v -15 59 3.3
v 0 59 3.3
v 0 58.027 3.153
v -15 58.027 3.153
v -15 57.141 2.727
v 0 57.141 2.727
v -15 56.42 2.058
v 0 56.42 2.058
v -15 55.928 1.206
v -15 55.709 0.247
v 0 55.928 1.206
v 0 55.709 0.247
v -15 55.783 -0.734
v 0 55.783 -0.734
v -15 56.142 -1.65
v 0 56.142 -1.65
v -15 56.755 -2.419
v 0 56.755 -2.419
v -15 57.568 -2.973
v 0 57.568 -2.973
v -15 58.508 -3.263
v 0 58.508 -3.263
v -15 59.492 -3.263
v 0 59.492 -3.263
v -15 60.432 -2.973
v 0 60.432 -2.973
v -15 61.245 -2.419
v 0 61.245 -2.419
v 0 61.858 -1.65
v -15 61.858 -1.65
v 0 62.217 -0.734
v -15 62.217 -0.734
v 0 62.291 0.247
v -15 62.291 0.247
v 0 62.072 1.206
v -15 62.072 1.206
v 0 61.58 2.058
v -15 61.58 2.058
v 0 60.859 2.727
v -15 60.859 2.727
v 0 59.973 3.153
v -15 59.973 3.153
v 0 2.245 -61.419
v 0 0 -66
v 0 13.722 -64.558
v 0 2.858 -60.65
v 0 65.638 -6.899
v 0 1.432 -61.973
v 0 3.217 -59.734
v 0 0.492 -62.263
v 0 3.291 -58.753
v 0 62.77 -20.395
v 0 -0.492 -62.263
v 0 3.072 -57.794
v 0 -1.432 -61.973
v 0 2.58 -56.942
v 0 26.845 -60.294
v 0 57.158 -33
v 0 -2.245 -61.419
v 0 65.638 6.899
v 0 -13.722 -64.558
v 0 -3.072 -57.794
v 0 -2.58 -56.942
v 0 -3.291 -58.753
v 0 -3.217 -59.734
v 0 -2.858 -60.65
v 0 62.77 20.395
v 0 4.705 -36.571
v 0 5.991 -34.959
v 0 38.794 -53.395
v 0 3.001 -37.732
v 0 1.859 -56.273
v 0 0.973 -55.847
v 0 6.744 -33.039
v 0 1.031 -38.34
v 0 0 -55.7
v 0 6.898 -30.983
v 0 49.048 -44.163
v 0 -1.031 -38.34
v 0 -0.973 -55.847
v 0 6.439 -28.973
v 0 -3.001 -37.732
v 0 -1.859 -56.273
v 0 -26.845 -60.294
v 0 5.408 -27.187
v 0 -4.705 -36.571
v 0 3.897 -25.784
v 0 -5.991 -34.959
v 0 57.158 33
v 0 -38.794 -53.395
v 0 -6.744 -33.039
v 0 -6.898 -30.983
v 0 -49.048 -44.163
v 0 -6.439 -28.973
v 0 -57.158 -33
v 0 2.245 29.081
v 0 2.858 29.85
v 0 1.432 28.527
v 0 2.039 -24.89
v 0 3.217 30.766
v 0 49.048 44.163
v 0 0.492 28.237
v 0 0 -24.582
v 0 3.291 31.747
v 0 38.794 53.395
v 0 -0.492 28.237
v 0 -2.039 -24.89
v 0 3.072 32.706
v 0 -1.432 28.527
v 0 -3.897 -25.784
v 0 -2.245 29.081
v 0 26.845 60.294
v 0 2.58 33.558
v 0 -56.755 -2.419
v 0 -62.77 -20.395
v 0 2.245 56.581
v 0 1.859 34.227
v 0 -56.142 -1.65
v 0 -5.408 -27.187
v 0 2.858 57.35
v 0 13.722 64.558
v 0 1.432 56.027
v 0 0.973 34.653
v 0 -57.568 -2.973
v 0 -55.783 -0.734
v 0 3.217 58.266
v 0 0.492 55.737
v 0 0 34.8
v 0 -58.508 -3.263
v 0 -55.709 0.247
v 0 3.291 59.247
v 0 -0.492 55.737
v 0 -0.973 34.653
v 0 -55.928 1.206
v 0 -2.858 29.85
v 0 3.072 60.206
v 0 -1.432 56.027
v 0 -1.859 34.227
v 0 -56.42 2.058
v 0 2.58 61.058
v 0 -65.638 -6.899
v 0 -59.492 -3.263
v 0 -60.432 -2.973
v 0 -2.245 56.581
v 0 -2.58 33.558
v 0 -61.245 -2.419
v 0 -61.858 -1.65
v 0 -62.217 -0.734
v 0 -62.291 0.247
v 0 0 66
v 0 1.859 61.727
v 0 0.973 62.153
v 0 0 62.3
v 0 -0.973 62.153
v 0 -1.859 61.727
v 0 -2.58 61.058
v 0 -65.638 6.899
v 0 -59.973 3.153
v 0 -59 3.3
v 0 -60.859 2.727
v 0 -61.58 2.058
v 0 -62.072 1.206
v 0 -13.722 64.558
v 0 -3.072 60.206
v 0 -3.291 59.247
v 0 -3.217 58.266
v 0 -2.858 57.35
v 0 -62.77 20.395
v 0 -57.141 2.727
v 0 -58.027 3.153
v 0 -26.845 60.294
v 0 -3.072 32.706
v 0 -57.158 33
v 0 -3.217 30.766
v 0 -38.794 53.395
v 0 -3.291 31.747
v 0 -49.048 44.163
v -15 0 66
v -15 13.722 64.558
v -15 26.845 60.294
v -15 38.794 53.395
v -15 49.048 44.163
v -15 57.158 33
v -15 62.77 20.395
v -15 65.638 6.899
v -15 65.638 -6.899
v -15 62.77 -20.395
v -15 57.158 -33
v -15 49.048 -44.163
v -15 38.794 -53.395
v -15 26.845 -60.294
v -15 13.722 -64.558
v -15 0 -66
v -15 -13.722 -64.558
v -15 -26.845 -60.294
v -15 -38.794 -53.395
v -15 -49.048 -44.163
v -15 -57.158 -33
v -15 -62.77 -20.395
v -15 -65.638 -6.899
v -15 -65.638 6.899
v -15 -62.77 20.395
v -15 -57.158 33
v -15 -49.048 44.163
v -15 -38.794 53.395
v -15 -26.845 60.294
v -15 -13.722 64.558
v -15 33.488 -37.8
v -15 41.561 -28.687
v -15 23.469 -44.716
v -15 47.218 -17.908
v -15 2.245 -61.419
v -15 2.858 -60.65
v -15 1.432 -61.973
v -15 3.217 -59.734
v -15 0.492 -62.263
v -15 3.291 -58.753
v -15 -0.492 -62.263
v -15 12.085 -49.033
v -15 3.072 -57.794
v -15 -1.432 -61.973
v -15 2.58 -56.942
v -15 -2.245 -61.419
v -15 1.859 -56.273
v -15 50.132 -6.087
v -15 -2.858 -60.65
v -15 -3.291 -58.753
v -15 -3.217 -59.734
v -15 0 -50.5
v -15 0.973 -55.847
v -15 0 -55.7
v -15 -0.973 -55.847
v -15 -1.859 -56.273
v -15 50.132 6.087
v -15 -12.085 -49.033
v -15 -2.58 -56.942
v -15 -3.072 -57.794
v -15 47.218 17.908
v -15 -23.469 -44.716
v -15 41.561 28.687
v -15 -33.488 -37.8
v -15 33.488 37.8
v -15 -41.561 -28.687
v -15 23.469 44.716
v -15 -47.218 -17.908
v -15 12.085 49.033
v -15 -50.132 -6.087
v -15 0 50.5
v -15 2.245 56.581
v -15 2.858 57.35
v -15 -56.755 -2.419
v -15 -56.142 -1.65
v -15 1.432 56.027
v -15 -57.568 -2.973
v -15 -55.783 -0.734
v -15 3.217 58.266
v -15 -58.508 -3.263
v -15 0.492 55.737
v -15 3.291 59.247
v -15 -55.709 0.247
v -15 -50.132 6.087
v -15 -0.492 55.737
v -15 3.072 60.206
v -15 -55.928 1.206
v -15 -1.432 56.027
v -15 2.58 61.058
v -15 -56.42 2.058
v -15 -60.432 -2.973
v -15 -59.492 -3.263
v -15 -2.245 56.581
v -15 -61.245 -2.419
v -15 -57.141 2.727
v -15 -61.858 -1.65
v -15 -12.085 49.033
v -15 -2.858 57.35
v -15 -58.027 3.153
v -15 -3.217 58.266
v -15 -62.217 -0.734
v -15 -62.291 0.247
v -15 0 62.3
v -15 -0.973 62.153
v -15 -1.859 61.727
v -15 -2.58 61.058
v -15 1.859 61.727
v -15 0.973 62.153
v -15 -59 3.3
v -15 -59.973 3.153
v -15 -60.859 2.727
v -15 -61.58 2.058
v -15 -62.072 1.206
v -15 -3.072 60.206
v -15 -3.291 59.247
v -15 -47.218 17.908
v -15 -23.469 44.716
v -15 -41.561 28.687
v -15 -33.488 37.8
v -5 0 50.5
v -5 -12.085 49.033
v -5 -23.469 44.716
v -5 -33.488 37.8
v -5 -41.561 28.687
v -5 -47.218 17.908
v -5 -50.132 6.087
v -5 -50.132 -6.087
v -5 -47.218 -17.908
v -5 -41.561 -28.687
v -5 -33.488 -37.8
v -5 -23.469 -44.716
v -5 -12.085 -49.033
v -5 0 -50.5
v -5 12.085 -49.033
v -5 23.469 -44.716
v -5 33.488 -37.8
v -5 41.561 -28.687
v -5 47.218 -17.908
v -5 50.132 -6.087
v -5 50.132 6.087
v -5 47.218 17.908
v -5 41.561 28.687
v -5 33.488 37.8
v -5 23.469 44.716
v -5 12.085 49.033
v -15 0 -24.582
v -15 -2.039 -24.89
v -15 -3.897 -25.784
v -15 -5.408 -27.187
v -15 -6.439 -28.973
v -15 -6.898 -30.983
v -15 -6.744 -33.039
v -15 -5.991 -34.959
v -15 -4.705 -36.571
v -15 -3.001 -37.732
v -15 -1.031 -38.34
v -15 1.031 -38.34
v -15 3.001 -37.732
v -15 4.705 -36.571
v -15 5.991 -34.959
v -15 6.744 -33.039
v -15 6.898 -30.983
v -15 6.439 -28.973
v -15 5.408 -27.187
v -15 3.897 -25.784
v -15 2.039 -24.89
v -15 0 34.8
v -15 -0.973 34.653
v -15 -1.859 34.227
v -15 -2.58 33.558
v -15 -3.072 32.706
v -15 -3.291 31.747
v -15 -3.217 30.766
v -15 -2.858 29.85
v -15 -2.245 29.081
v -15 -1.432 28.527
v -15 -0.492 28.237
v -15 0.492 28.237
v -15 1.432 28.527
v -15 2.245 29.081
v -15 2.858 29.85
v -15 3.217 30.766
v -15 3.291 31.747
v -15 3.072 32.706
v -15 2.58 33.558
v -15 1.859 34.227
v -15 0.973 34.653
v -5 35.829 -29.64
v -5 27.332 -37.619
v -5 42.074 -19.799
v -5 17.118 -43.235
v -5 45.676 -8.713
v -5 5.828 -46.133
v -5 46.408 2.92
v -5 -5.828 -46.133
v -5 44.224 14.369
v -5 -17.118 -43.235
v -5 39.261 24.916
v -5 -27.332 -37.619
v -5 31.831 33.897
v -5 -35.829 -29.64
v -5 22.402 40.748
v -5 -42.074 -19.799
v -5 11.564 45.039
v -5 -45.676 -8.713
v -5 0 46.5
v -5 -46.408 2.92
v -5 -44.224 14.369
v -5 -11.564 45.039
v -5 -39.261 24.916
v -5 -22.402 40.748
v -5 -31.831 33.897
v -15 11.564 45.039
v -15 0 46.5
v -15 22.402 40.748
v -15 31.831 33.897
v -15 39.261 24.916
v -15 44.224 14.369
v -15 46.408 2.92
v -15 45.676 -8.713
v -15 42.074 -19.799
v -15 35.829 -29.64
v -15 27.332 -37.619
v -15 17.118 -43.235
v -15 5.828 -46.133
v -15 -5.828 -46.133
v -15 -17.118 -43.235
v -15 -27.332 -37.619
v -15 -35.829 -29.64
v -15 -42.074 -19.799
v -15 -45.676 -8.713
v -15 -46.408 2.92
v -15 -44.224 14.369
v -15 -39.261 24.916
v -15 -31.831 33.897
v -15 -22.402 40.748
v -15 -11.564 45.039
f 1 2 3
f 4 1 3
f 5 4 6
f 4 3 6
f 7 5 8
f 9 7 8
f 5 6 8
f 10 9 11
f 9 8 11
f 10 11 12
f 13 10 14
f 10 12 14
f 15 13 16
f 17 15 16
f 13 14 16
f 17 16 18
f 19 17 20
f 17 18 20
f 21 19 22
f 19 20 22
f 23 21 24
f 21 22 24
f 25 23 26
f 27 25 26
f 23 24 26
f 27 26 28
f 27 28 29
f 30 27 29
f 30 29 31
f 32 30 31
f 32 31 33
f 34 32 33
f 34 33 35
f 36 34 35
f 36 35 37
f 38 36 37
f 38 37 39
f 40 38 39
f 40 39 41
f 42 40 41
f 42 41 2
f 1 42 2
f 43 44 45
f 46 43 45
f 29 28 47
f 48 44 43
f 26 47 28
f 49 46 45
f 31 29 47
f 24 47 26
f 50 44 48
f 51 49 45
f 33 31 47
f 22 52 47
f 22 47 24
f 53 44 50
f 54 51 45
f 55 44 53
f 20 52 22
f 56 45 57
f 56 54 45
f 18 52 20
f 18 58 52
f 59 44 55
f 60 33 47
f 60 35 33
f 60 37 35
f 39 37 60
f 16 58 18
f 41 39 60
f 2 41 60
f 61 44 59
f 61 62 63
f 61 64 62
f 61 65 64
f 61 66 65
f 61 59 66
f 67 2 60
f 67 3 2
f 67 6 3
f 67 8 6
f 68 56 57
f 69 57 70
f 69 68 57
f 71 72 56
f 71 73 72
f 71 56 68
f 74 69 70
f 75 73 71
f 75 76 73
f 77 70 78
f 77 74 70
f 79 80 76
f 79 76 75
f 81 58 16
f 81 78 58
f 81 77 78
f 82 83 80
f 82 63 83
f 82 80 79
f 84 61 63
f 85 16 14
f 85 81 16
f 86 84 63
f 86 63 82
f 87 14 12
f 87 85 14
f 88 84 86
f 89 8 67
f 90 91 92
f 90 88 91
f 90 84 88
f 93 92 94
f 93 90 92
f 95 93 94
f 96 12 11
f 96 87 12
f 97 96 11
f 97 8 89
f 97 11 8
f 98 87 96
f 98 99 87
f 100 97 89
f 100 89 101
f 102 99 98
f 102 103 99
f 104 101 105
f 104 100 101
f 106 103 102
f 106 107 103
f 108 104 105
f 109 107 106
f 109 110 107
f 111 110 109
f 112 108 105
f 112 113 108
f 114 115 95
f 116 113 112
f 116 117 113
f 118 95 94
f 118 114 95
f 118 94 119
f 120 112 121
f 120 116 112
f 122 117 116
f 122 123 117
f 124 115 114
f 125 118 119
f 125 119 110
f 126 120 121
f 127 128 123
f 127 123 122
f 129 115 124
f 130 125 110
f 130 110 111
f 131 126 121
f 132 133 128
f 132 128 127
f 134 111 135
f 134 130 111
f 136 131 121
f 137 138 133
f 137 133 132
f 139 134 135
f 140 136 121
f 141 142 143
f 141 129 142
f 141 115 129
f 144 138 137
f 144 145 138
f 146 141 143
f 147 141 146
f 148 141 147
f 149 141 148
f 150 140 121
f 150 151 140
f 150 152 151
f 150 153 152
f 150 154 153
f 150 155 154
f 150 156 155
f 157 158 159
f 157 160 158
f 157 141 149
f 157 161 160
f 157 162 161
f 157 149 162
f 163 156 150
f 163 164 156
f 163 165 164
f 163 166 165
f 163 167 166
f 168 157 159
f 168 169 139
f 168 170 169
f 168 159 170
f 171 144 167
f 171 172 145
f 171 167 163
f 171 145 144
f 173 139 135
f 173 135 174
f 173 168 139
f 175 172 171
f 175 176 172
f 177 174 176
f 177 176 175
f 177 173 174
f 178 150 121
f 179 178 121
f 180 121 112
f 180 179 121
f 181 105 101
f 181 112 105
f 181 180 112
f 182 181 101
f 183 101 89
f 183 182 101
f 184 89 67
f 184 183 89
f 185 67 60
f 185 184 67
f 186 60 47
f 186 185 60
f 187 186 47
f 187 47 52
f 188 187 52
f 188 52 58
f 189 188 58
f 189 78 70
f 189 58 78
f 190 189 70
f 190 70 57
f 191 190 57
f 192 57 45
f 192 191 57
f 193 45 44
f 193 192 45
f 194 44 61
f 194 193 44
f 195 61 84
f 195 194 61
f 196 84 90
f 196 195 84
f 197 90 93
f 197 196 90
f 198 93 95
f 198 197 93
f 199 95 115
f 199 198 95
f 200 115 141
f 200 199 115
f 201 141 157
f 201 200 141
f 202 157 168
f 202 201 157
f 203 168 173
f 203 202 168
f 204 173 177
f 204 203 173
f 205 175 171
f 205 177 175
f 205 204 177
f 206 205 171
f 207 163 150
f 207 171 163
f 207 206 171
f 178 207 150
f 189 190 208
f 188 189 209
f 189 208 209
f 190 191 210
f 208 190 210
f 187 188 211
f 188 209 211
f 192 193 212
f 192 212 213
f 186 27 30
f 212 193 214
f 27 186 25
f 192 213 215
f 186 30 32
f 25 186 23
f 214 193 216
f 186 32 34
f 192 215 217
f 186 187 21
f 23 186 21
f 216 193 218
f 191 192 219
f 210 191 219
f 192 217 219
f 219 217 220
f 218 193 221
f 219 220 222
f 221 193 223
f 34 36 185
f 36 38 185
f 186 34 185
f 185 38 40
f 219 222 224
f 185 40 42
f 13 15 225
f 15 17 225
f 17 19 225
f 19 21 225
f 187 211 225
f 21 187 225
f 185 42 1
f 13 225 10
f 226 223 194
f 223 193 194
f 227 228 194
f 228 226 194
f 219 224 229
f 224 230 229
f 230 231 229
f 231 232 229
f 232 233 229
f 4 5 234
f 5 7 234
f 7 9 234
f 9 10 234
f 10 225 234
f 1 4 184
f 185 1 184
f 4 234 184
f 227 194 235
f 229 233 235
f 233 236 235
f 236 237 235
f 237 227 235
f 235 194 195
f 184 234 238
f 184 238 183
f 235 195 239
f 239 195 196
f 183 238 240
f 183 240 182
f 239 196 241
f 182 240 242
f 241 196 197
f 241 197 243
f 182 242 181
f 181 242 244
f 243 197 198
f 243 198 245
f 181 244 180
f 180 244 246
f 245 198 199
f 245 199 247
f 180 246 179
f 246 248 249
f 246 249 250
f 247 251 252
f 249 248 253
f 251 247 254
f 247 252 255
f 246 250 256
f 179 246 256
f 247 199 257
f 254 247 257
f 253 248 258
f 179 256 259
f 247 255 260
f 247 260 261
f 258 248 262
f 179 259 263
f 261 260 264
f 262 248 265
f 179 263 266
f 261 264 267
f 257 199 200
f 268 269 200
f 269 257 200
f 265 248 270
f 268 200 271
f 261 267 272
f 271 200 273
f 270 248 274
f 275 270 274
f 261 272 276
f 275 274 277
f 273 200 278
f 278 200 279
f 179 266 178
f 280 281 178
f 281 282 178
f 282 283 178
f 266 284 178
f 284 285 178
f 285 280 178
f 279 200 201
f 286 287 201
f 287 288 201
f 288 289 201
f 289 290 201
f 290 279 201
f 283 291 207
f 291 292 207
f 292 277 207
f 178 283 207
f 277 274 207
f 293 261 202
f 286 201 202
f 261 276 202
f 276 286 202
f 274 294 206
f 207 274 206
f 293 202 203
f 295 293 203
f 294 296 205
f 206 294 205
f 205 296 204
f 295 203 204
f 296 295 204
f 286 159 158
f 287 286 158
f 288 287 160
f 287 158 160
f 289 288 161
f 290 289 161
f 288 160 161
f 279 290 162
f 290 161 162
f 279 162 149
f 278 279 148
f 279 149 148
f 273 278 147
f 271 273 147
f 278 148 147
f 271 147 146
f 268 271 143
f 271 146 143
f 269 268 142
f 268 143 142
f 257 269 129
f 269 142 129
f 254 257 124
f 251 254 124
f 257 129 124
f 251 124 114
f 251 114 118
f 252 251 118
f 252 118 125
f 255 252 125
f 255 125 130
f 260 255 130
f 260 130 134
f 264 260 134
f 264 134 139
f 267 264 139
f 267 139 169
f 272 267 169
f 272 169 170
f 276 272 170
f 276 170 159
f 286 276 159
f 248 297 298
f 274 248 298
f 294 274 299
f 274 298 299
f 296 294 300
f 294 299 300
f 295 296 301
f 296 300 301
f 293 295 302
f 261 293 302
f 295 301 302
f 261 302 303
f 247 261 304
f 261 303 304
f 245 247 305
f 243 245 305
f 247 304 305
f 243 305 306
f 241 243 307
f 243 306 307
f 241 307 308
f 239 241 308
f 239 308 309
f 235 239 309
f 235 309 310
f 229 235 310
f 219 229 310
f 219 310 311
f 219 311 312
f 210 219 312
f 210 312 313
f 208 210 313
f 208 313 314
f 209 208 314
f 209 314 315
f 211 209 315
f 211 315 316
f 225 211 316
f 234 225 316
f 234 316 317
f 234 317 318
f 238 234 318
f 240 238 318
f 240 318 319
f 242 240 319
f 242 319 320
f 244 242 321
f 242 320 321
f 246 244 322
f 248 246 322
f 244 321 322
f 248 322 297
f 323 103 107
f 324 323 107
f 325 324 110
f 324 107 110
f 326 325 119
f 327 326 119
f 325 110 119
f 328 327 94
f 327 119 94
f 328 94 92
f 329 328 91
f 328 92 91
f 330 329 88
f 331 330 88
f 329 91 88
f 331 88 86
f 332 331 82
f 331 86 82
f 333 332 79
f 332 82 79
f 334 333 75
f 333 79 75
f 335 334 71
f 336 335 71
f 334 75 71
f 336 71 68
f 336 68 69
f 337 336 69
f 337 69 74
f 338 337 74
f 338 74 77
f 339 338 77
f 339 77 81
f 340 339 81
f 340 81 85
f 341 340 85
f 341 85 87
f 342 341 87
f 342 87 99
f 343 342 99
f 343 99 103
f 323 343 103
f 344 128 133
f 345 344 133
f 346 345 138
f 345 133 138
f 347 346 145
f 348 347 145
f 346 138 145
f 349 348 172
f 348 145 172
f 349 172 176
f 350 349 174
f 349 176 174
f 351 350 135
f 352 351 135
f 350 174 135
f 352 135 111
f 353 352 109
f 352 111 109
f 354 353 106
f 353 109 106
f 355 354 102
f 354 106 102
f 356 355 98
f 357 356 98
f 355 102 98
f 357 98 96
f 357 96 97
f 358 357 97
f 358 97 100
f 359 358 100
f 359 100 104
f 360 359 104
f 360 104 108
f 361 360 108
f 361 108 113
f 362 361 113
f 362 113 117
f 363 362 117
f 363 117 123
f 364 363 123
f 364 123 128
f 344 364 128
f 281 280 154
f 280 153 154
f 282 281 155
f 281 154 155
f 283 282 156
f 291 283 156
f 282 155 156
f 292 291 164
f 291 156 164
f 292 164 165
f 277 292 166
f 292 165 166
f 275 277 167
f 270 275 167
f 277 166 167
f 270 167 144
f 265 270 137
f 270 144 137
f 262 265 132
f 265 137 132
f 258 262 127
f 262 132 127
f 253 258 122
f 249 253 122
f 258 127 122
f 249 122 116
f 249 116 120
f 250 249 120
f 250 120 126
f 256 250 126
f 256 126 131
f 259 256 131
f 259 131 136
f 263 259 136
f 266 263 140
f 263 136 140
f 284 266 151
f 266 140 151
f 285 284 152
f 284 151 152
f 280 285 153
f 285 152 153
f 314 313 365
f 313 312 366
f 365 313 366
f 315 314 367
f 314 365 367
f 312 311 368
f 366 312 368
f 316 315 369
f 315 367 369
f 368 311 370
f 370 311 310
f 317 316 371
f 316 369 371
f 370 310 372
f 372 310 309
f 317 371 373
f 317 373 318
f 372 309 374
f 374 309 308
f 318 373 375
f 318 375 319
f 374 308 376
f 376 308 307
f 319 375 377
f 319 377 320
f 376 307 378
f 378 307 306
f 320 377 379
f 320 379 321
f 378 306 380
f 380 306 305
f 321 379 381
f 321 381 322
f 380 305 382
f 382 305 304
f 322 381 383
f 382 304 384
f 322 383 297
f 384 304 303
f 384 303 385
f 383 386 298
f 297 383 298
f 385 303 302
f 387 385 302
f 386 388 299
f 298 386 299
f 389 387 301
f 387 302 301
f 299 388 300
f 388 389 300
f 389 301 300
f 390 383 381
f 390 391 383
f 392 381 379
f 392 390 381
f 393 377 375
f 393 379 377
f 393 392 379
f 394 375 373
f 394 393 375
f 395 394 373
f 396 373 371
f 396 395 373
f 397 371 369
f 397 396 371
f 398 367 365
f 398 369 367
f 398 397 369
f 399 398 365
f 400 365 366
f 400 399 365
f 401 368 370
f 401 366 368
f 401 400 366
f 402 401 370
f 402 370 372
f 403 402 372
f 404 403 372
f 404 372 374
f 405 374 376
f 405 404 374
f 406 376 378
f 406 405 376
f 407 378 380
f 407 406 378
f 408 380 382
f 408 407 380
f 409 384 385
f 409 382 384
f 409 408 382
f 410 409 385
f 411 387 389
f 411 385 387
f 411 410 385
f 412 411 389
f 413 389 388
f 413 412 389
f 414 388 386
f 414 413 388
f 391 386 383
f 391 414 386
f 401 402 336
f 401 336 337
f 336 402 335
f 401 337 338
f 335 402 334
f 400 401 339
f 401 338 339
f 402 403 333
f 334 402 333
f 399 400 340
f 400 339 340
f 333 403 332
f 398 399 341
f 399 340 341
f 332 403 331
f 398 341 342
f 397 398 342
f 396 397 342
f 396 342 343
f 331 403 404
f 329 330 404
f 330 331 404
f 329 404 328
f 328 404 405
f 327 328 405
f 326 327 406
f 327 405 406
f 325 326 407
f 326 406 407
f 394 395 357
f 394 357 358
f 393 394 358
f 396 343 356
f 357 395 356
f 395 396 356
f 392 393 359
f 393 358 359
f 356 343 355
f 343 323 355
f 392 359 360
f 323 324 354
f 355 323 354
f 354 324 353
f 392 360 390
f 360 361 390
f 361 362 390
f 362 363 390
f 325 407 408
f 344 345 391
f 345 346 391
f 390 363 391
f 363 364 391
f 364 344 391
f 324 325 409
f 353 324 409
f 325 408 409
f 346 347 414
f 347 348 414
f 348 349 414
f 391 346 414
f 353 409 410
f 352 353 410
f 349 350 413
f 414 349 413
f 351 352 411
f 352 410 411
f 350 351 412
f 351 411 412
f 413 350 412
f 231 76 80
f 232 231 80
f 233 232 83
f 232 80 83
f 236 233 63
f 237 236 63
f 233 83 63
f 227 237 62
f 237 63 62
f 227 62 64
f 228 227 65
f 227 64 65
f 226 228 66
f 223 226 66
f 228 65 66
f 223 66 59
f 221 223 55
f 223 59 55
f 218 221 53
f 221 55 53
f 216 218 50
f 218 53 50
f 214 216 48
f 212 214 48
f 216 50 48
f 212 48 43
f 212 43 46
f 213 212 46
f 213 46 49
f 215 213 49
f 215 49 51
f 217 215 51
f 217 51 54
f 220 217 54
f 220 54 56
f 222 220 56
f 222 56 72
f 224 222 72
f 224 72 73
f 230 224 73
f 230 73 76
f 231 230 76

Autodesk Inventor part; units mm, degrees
ref_plane "YZ Plane" through (0, 0, 0) normal (1, 0, 0) x (0, 1, 0)
ref_plane "XZ Plane" through (0, 0, 0) normal (0, 1, 0) x (-1, 0, 0)
ref_plane "XY Plane" through (0, 0, 0) normal (0, 0, 1) x (1, 0, 0)
sketch "Sketch4" plane through (0, 0, 0) normal (0, 1, 0) x (-1, 0, 0)
  line L0 (0, 0) -> (0, 66)
  line L1 (0, 66) -> (15, 66)
  line L2 (15, 66) -> (15, 50.5)
  line L3 (15, 50.5) -> (5, 50.5)
  line L4 (5, 50.5) -> (5, 46.5)
  line L5 (5, 46.5) -> (15, 46.5)
  line L6 (15, 46.5) -> (15, 0)
  line L7 (15, 0) -> (0, 0)
  dimension "d6" = 66
  dimension "d7" = 15
  dimension "d8" = 15.5
  dimension "d9" = 10
  dimension "d10" = 4
revolve "Revolution1" add sketch "Sketch4" angle 360 about axis through (-15, 0, 0) along (1, 0, 0)
sketch "Sketch5" plane through (-15, 0, 0) normal (-1, 0, 0) x (0, 0, 1)
  point P0 (0, 0)
sketch "Sketch6" plane through (-15, 0, 0) normal (-1, 0, 0) x (0, 0, 1)
  circle A0 centre (0, 0) radius 59
  point P0 (59, 0)
  point P1 (0, -59)
  point P2 (-59, 0)
  point P3 (0, 59)
  dimension "d13" = 118
hole "Hole1" at (-15, 0, 59) at (-15, -59, 0) at (-15, 0, -59) at (-15, 59, 0) direction (1, 0, 0) diameter 6.6 end through all clearance for "Flat Head Machine Screw" size "M6" standard "Ansi Metric M Profile"
sketch "Sketch7" plane through (-15, 0, 0) normal (-1, 0, 0) x (0, 0, 1)
  circle A0 centre (0, 0) radius 31.5
  point P0 (31.5, 0)
  dimension "d21" = 63
hole "Hole2" at (-15, 0, 31.5) direction (1, 0, 0) diameter 6.6 end through all clearance for "Flat Head Machine Screw" size "M6" standard "Ansi Metric M Profile"
sketch "Sketch8" plane through (-15, 0, 0) normal (-1, 0, 0) x (0, 0, 1)
  circle A0 centre (0, 0) radius 31.5
  point P0 (-31.5, 0)
  dimension "d29" = 63
hole "Hole3" at (-15, 0, -31.5) direction (1, 0, 0) diameter 13.835 end through all thread size "M16x2" class "6H" standard "ANSI Metric M Profile"
properties part number "100mm-FlangeBottom-Sketch"
